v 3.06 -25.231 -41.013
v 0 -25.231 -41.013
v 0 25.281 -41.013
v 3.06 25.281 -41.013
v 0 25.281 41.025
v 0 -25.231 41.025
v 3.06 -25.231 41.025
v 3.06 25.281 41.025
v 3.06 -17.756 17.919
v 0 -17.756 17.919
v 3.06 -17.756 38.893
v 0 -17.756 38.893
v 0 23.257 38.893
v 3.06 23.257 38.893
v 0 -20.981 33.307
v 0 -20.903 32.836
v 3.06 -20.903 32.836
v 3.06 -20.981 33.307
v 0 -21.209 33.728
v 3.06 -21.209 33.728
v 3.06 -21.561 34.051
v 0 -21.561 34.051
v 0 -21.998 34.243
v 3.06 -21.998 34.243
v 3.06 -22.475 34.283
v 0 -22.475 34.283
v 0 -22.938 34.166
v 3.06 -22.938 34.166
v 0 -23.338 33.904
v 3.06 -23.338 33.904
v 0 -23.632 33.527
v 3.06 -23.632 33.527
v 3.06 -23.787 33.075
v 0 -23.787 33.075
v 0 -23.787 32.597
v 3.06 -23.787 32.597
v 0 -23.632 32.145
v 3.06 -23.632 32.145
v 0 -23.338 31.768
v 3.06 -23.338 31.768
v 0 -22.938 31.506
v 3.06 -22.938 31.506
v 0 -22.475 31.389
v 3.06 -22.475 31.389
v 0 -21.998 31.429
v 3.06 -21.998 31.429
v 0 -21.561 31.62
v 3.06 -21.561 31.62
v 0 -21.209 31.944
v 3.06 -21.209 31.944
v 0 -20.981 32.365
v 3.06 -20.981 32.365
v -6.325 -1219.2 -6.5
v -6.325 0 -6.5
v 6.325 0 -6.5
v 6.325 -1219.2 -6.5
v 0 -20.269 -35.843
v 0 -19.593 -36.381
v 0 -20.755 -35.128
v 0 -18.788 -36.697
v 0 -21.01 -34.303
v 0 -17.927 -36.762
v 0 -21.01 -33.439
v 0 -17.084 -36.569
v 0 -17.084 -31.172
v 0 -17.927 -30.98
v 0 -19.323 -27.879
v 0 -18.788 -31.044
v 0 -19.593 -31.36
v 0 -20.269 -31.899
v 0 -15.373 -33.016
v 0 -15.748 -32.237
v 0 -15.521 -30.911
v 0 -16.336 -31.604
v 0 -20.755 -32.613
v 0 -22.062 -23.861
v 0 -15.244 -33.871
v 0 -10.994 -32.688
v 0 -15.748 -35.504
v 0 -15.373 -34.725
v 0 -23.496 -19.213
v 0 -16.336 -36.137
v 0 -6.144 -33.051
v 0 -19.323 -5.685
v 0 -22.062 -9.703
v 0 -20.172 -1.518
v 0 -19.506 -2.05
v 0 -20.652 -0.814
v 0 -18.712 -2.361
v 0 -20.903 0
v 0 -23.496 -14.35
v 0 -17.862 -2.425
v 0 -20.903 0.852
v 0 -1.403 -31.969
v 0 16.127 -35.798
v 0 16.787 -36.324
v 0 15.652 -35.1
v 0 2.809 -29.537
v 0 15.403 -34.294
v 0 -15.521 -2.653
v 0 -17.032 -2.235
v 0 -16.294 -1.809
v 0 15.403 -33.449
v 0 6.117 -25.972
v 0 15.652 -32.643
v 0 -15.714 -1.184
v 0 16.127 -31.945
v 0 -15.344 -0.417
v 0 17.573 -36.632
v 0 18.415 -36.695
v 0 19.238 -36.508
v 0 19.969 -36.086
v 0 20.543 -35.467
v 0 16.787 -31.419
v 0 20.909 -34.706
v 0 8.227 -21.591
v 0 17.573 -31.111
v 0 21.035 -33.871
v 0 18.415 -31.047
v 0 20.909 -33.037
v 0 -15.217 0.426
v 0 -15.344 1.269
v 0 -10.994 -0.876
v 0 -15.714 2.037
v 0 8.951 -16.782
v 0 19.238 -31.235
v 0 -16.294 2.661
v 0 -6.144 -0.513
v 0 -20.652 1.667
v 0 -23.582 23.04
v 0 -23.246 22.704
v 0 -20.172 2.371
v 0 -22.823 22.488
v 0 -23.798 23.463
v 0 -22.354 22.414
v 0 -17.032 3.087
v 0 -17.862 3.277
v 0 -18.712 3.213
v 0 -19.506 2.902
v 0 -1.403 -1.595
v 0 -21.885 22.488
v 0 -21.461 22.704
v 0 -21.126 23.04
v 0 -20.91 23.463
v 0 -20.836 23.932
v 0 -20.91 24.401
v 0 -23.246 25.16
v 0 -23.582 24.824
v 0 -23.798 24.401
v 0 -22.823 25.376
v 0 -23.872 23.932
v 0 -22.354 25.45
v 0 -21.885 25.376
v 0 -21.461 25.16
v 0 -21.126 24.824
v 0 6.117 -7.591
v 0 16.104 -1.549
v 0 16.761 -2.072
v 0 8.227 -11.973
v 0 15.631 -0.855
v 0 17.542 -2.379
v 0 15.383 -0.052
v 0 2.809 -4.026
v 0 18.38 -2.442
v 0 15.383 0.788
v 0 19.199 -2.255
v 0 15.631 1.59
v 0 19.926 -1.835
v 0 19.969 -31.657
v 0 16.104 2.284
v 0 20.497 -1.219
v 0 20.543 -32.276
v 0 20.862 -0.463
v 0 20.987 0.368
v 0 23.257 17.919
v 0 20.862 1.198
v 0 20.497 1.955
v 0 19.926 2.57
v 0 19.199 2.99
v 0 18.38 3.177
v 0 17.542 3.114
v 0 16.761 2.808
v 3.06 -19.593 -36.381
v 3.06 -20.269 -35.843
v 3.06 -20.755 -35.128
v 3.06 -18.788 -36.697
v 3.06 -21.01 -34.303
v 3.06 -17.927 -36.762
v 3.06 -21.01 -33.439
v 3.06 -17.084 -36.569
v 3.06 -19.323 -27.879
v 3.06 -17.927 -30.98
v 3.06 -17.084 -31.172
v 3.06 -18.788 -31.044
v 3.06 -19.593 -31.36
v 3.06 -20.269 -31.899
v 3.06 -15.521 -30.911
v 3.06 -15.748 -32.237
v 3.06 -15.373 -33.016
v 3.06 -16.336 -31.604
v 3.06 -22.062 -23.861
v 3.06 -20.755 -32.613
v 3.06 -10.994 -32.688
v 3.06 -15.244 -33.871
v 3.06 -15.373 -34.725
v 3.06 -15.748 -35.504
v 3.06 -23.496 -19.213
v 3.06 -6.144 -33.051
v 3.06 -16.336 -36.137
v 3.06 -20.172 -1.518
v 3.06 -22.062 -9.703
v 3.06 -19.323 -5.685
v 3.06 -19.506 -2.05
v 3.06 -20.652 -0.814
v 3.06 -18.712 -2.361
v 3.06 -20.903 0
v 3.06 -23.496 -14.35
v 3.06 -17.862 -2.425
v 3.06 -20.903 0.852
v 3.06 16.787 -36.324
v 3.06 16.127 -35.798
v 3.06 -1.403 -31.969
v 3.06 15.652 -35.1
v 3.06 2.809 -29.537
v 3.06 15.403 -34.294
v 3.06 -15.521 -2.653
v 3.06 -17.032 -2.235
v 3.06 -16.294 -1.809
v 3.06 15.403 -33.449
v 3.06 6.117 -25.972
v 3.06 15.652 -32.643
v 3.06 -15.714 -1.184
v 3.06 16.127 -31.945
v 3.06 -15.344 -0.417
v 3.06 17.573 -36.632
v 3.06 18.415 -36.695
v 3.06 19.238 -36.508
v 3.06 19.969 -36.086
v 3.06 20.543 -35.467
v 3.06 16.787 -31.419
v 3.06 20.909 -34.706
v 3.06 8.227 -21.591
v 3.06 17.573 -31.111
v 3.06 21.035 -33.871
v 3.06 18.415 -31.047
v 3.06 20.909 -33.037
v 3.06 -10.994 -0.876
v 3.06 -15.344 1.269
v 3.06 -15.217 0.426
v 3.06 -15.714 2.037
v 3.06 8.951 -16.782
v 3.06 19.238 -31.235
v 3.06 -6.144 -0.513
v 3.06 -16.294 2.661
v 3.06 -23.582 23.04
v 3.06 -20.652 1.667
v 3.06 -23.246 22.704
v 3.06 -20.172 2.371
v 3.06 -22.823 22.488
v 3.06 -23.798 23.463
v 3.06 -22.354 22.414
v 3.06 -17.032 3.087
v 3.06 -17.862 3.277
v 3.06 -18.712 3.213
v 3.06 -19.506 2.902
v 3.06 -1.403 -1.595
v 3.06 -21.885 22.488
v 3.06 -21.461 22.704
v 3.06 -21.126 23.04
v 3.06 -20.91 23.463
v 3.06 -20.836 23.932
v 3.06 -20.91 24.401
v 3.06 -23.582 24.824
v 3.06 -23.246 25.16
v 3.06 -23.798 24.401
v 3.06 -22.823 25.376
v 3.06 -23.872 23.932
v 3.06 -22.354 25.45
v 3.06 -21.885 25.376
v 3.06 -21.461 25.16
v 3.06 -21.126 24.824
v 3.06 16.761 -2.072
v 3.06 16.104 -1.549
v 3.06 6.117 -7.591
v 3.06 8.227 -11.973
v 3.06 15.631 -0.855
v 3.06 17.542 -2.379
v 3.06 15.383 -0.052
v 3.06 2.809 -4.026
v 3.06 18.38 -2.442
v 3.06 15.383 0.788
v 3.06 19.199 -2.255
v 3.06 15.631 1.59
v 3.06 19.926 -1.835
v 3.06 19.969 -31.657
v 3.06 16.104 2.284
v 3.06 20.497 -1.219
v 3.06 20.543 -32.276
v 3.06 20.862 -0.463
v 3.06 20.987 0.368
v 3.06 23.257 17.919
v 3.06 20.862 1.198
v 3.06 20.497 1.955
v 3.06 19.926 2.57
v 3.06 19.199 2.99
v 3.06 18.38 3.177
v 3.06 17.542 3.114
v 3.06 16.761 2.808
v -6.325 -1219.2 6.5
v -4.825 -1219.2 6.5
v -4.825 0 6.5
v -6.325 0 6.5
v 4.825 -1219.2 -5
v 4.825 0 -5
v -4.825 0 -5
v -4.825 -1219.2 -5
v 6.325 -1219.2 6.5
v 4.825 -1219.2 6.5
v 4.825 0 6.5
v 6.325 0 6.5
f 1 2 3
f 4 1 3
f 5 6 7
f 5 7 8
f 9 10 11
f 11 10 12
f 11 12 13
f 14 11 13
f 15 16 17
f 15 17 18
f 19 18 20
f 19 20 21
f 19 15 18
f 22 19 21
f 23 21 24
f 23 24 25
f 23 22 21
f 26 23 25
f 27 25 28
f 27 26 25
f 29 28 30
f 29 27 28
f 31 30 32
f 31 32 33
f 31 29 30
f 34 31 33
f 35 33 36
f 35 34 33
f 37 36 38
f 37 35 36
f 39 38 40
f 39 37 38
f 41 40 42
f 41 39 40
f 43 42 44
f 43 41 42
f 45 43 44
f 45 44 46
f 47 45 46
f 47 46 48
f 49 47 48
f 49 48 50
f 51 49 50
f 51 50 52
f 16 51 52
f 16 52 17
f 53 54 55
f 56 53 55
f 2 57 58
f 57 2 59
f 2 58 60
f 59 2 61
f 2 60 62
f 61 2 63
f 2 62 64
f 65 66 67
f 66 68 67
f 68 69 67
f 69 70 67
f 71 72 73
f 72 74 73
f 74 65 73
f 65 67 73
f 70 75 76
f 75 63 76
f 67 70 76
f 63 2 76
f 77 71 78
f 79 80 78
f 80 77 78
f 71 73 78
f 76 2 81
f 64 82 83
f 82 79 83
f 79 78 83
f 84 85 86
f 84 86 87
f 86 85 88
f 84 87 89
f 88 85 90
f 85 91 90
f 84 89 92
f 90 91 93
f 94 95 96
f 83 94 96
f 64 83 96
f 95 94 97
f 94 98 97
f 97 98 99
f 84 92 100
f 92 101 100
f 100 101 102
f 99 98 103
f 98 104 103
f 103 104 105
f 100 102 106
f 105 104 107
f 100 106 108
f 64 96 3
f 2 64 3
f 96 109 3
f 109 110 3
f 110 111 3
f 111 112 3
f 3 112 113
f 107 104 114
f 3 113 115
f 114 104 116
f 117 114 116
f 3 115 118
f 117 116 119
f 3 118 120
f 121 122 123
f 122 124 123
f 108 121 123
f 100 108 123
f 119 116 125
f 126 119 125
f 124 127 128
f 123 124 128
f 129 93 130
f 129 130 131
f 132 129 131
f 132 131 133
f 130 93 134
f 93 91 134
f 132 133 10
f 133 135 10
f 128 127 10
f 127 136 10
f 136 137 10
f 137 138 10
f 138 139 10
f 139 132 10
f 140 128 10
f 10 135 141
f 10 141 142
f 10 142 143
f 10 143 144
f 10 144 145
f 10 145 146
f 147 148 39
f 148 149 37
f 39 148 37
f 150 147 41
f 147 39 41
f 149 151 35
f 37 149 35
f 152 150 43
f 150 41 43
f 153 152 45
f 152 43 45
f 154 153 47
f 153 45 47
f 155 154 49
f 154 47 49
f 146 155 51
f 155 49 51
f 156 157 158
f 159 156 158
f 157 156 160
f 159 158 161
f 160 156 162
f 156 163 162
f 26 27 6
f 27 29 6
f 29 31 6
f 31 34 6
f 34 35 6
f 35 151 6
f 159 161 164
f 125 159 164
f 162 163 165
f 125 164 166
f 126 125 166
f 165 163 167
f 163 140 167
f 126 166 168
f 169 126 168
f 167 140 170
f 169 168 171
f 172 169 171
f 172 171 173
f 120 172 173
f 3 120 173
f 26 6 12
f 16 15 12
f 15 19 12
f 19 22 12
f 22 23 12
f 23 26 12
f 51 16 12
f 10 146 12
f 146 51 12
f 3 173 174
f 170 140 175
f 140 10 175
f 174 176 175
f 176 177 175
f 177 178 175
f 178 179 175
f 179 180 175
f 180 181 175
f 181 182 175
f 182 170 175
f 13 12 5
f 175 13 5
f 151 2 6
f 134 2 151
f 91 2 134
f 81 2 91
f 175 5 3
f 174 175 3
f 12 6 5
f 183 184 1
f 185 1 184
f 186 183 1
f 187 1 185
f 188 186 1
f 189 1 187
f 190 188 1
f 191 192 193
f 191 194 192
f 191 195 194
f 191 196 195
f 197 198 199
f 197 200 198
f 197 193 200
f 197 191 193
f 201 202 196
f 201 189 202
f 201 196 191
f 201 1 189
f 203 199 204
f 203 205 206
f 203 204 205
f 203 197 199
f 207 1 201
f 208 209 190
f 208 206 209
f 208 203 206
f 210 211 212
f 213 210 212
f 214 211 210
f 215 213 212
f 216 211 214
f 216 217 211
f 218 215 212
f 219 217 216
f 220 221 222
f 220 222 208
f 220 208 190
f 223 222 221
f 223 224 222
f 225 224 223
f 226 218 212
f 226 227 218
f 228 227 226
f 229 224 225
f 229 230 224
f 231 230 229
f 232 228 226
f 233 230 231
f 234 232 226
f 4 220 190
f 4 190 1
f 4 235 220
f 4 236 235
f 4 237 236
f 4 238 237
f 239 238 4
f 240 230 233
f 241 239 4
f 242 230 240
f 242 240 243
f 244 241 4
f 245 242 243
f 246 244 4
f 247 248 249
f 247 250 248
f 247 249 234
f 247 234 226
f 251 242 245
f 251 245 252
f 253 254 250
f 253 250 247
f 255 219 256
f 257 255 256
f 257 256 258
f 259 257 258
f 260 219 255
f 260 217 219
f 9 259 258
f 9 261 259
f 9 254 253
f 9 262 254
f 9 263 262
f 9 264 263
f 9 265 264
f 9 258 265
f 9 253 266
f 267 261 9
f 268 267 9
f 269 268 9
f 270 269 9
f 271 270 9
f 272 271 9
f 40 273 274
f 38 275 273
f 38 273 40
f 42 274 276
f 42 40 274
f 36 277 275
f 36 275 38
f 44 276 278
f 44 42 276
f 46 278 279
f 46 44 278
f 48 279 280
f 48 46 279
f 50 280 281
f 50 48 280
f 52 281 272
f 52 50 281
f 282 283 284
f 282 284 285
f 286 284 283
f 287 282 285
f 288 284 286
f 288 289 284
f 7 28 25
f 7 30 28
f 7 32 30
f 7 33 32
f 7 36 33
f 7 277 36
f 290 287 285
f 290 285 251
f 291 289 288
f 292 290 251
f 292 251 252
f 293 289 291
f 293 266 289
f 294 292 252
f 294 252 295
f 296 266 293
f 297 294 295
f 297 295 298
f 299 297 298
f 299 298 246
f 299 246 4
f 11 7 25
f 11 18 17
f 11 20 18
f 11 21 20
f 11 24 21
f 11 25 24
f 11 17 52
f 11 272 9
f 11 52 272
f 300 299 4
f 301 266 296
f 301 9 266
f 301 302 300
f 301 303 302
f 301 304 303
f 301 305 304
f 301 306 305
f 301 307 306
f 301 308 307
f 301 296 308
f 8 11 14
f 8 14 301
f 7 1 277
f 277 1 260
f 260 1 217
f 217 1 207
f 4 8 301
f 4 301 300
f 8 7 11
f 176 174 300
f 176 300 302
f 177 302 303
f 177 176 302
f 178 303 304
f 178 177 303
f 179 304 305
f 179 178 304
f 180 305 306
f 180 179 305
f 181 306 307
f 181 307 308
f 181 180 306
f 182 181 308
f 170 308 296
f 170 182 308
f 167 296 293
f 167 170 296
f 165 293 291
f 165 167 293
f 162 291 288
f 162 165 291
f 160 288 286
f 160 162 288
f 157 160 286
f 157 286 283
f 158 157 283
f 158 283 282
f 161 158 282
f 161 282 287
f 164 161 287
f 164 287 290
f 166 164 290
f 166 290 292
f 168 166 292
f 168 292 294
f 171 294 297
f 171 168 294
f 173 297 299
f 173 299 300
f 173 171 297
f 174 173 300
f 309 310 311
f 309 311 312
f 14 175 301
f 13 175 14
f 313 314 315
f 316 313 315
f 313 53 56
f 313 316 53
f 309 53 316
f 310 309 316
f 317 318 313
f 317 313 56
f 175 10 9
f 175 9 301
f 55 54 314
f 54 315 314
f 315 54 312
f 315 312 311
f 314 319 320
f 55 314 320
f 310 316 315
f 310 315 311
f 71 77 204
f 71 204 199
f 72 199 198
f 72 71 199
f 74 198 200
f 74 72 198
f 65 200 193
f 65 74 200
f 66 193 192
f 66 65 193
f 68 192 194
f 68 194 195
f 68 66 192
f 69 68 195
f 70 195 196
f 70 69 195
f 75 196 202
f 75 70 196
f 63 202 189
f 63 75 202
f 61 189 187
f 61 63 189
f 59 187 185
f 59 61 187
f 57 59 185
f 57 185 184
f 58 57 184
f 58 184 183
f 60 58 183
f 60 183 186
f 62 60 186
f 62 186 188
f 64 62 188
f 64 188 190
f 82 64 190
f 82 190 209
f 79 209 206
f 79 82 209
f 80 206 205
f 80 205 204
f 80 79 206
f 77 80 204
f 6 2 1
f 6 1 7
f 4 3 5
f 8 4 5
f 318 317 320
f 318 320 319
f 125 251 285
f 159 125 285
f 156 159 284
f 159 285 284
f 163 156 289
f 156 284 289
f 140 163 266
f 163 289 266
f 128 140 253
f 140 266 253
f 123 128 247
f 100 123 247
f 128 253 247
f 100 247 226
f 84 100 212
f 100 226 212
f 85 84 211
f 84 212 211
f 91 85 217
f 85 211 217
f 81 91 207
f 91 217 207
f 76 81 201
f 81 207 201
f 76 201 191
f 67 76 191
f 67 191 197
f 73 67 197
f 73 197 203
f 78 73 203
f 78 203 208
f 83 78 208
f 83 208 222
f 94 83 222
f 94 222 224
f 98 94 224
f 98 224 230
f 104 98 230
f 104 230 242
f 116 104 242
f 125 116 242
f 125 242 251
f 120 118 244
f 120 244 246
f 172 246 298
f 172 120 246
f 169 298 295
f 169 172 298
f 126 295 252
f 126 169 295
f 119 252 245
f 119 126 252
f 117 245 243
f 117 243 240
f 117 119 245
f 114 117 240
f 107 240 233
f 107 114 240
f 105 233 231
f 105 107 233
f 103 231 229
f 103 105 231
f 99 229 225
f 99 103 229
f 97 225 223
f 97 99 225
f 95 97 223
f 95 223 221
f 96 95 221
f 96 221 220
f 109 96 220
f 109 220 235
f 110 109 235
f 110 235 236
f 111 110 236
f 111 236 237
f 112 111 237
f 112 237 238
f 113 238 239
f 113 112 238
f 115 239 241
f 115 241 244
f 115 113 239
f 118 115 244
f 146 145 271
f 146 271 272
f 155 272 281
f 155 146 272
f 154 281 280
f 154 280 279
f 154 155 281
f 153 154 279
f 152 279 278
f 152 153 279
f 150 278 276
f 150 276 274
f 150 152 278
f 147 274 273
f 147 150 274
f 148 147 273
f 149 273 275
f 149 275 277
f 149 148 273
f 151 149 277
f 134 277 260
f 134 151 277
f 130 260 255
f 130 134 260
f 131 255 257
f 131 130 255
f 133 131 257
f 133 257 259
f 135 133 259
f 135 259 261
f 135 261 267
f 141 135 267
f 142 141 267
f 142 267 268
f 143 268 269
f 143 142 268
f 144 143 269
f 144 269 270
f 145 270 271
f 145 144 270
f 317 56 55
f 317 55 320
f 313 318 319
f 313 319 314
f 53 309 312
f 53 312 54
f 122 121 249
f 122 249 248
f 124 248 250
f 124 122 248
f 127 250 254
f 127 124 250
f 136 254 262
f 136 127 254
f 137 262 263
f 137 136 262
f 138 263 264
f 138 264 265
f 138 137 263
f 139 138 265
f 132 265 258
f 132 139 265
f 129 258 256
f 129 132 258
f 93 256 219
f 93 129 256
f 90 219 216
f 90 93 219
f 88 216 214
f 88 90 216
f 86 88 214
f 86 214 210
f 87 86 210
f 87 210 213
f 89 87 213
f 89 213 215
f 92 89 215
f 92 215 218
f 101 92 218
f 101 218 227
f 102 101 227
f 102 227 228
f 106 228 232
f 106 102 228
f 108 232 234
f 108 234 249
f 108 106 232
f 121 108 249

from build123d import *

# Parameters (mm, degrees)
F1_DEPTH = 1219.2
F2_W     = 50.5127292126
F2_H     = 82.0375010371
F2_R     = 2.89913405
F2_R_2   = 2.8318920873
F2_R_3   = 2.8588761336
F2_R_4   = 1.5183628154
F2_R_5   = 1.4519166982
F2_R_6   = 2.8173846153
F2_W_2   = 41.0130396485
F2_H_2   = 20.9737662226
F3_DEPTH = 3.06
F5_R     = 16.3147290841
F6_DEPTH = 5


with BuildPart() as f1:
    # F0 (on Front) → F1 (new body)
    with BuildSketch(Plane.XZ):
        Polygon((-4.825, 6.5), (-6.325, 6.5), (-6.325, -6.5), (6.325, -6.5), (6.325, 6.5), (4.825, 6.5), (4.825, -5), (-4.825, -5), align=None)
    extrude(amount=F1_DEPTH)


with BuildPart() as f3:
    # F2 (on Right) → F3 (new body)
    with BuildSketch(Plane.YZ):
        with Locations((0.0250553712, 0.0057928264)):
            Rectangle(F2_W, F2_H)
        with Locations((-18.1433722998, -33.8706020266)):
            Circle(F2_R, mode=Mode.SUBTRACT)
        with Locations((18.2029870339, -33.8714673854)):
            Circle(F2_R_2, mode=Mode.SUBTRACT)
        with Locations((-18.0760649964, 0.4261299481)):
            Circle(F2_R_3, mode=Mode.SUBTRACT)
        with Locations((-22.3539447378, 23.9319726942)):
            Circle(F2_R_4, mode=Mode.SUBTRACT)
        with Locations((-22.3546241195, 32.8359914765)):
            Circle(F2_R_5, mode=Mode.SUBTRACT)
        with Locations((18.1693327613, 0.3677118686)):
            Circle(F2_R_6, mode=Mode.SUBTRACT)
        with Locations((2.7500502765, 28.4059746191)):
            Rectangle(F2_W_2, F2_H_2, mode=Mode.SUBTRACT)
    extrude(amount=F3_DEPTH)

    # F5 (on face) → F6 (cut)
    with BuildSketch(Plane.YZ.offset(3.06)):
        with Locations((-7.363283649, -16.781862238)):
            Circle(F5_R)
    extrude(amount=-F6_DEPTH, mode=Mode.SUBTRACT)


solid = Compound([f1.part, f3.part])
